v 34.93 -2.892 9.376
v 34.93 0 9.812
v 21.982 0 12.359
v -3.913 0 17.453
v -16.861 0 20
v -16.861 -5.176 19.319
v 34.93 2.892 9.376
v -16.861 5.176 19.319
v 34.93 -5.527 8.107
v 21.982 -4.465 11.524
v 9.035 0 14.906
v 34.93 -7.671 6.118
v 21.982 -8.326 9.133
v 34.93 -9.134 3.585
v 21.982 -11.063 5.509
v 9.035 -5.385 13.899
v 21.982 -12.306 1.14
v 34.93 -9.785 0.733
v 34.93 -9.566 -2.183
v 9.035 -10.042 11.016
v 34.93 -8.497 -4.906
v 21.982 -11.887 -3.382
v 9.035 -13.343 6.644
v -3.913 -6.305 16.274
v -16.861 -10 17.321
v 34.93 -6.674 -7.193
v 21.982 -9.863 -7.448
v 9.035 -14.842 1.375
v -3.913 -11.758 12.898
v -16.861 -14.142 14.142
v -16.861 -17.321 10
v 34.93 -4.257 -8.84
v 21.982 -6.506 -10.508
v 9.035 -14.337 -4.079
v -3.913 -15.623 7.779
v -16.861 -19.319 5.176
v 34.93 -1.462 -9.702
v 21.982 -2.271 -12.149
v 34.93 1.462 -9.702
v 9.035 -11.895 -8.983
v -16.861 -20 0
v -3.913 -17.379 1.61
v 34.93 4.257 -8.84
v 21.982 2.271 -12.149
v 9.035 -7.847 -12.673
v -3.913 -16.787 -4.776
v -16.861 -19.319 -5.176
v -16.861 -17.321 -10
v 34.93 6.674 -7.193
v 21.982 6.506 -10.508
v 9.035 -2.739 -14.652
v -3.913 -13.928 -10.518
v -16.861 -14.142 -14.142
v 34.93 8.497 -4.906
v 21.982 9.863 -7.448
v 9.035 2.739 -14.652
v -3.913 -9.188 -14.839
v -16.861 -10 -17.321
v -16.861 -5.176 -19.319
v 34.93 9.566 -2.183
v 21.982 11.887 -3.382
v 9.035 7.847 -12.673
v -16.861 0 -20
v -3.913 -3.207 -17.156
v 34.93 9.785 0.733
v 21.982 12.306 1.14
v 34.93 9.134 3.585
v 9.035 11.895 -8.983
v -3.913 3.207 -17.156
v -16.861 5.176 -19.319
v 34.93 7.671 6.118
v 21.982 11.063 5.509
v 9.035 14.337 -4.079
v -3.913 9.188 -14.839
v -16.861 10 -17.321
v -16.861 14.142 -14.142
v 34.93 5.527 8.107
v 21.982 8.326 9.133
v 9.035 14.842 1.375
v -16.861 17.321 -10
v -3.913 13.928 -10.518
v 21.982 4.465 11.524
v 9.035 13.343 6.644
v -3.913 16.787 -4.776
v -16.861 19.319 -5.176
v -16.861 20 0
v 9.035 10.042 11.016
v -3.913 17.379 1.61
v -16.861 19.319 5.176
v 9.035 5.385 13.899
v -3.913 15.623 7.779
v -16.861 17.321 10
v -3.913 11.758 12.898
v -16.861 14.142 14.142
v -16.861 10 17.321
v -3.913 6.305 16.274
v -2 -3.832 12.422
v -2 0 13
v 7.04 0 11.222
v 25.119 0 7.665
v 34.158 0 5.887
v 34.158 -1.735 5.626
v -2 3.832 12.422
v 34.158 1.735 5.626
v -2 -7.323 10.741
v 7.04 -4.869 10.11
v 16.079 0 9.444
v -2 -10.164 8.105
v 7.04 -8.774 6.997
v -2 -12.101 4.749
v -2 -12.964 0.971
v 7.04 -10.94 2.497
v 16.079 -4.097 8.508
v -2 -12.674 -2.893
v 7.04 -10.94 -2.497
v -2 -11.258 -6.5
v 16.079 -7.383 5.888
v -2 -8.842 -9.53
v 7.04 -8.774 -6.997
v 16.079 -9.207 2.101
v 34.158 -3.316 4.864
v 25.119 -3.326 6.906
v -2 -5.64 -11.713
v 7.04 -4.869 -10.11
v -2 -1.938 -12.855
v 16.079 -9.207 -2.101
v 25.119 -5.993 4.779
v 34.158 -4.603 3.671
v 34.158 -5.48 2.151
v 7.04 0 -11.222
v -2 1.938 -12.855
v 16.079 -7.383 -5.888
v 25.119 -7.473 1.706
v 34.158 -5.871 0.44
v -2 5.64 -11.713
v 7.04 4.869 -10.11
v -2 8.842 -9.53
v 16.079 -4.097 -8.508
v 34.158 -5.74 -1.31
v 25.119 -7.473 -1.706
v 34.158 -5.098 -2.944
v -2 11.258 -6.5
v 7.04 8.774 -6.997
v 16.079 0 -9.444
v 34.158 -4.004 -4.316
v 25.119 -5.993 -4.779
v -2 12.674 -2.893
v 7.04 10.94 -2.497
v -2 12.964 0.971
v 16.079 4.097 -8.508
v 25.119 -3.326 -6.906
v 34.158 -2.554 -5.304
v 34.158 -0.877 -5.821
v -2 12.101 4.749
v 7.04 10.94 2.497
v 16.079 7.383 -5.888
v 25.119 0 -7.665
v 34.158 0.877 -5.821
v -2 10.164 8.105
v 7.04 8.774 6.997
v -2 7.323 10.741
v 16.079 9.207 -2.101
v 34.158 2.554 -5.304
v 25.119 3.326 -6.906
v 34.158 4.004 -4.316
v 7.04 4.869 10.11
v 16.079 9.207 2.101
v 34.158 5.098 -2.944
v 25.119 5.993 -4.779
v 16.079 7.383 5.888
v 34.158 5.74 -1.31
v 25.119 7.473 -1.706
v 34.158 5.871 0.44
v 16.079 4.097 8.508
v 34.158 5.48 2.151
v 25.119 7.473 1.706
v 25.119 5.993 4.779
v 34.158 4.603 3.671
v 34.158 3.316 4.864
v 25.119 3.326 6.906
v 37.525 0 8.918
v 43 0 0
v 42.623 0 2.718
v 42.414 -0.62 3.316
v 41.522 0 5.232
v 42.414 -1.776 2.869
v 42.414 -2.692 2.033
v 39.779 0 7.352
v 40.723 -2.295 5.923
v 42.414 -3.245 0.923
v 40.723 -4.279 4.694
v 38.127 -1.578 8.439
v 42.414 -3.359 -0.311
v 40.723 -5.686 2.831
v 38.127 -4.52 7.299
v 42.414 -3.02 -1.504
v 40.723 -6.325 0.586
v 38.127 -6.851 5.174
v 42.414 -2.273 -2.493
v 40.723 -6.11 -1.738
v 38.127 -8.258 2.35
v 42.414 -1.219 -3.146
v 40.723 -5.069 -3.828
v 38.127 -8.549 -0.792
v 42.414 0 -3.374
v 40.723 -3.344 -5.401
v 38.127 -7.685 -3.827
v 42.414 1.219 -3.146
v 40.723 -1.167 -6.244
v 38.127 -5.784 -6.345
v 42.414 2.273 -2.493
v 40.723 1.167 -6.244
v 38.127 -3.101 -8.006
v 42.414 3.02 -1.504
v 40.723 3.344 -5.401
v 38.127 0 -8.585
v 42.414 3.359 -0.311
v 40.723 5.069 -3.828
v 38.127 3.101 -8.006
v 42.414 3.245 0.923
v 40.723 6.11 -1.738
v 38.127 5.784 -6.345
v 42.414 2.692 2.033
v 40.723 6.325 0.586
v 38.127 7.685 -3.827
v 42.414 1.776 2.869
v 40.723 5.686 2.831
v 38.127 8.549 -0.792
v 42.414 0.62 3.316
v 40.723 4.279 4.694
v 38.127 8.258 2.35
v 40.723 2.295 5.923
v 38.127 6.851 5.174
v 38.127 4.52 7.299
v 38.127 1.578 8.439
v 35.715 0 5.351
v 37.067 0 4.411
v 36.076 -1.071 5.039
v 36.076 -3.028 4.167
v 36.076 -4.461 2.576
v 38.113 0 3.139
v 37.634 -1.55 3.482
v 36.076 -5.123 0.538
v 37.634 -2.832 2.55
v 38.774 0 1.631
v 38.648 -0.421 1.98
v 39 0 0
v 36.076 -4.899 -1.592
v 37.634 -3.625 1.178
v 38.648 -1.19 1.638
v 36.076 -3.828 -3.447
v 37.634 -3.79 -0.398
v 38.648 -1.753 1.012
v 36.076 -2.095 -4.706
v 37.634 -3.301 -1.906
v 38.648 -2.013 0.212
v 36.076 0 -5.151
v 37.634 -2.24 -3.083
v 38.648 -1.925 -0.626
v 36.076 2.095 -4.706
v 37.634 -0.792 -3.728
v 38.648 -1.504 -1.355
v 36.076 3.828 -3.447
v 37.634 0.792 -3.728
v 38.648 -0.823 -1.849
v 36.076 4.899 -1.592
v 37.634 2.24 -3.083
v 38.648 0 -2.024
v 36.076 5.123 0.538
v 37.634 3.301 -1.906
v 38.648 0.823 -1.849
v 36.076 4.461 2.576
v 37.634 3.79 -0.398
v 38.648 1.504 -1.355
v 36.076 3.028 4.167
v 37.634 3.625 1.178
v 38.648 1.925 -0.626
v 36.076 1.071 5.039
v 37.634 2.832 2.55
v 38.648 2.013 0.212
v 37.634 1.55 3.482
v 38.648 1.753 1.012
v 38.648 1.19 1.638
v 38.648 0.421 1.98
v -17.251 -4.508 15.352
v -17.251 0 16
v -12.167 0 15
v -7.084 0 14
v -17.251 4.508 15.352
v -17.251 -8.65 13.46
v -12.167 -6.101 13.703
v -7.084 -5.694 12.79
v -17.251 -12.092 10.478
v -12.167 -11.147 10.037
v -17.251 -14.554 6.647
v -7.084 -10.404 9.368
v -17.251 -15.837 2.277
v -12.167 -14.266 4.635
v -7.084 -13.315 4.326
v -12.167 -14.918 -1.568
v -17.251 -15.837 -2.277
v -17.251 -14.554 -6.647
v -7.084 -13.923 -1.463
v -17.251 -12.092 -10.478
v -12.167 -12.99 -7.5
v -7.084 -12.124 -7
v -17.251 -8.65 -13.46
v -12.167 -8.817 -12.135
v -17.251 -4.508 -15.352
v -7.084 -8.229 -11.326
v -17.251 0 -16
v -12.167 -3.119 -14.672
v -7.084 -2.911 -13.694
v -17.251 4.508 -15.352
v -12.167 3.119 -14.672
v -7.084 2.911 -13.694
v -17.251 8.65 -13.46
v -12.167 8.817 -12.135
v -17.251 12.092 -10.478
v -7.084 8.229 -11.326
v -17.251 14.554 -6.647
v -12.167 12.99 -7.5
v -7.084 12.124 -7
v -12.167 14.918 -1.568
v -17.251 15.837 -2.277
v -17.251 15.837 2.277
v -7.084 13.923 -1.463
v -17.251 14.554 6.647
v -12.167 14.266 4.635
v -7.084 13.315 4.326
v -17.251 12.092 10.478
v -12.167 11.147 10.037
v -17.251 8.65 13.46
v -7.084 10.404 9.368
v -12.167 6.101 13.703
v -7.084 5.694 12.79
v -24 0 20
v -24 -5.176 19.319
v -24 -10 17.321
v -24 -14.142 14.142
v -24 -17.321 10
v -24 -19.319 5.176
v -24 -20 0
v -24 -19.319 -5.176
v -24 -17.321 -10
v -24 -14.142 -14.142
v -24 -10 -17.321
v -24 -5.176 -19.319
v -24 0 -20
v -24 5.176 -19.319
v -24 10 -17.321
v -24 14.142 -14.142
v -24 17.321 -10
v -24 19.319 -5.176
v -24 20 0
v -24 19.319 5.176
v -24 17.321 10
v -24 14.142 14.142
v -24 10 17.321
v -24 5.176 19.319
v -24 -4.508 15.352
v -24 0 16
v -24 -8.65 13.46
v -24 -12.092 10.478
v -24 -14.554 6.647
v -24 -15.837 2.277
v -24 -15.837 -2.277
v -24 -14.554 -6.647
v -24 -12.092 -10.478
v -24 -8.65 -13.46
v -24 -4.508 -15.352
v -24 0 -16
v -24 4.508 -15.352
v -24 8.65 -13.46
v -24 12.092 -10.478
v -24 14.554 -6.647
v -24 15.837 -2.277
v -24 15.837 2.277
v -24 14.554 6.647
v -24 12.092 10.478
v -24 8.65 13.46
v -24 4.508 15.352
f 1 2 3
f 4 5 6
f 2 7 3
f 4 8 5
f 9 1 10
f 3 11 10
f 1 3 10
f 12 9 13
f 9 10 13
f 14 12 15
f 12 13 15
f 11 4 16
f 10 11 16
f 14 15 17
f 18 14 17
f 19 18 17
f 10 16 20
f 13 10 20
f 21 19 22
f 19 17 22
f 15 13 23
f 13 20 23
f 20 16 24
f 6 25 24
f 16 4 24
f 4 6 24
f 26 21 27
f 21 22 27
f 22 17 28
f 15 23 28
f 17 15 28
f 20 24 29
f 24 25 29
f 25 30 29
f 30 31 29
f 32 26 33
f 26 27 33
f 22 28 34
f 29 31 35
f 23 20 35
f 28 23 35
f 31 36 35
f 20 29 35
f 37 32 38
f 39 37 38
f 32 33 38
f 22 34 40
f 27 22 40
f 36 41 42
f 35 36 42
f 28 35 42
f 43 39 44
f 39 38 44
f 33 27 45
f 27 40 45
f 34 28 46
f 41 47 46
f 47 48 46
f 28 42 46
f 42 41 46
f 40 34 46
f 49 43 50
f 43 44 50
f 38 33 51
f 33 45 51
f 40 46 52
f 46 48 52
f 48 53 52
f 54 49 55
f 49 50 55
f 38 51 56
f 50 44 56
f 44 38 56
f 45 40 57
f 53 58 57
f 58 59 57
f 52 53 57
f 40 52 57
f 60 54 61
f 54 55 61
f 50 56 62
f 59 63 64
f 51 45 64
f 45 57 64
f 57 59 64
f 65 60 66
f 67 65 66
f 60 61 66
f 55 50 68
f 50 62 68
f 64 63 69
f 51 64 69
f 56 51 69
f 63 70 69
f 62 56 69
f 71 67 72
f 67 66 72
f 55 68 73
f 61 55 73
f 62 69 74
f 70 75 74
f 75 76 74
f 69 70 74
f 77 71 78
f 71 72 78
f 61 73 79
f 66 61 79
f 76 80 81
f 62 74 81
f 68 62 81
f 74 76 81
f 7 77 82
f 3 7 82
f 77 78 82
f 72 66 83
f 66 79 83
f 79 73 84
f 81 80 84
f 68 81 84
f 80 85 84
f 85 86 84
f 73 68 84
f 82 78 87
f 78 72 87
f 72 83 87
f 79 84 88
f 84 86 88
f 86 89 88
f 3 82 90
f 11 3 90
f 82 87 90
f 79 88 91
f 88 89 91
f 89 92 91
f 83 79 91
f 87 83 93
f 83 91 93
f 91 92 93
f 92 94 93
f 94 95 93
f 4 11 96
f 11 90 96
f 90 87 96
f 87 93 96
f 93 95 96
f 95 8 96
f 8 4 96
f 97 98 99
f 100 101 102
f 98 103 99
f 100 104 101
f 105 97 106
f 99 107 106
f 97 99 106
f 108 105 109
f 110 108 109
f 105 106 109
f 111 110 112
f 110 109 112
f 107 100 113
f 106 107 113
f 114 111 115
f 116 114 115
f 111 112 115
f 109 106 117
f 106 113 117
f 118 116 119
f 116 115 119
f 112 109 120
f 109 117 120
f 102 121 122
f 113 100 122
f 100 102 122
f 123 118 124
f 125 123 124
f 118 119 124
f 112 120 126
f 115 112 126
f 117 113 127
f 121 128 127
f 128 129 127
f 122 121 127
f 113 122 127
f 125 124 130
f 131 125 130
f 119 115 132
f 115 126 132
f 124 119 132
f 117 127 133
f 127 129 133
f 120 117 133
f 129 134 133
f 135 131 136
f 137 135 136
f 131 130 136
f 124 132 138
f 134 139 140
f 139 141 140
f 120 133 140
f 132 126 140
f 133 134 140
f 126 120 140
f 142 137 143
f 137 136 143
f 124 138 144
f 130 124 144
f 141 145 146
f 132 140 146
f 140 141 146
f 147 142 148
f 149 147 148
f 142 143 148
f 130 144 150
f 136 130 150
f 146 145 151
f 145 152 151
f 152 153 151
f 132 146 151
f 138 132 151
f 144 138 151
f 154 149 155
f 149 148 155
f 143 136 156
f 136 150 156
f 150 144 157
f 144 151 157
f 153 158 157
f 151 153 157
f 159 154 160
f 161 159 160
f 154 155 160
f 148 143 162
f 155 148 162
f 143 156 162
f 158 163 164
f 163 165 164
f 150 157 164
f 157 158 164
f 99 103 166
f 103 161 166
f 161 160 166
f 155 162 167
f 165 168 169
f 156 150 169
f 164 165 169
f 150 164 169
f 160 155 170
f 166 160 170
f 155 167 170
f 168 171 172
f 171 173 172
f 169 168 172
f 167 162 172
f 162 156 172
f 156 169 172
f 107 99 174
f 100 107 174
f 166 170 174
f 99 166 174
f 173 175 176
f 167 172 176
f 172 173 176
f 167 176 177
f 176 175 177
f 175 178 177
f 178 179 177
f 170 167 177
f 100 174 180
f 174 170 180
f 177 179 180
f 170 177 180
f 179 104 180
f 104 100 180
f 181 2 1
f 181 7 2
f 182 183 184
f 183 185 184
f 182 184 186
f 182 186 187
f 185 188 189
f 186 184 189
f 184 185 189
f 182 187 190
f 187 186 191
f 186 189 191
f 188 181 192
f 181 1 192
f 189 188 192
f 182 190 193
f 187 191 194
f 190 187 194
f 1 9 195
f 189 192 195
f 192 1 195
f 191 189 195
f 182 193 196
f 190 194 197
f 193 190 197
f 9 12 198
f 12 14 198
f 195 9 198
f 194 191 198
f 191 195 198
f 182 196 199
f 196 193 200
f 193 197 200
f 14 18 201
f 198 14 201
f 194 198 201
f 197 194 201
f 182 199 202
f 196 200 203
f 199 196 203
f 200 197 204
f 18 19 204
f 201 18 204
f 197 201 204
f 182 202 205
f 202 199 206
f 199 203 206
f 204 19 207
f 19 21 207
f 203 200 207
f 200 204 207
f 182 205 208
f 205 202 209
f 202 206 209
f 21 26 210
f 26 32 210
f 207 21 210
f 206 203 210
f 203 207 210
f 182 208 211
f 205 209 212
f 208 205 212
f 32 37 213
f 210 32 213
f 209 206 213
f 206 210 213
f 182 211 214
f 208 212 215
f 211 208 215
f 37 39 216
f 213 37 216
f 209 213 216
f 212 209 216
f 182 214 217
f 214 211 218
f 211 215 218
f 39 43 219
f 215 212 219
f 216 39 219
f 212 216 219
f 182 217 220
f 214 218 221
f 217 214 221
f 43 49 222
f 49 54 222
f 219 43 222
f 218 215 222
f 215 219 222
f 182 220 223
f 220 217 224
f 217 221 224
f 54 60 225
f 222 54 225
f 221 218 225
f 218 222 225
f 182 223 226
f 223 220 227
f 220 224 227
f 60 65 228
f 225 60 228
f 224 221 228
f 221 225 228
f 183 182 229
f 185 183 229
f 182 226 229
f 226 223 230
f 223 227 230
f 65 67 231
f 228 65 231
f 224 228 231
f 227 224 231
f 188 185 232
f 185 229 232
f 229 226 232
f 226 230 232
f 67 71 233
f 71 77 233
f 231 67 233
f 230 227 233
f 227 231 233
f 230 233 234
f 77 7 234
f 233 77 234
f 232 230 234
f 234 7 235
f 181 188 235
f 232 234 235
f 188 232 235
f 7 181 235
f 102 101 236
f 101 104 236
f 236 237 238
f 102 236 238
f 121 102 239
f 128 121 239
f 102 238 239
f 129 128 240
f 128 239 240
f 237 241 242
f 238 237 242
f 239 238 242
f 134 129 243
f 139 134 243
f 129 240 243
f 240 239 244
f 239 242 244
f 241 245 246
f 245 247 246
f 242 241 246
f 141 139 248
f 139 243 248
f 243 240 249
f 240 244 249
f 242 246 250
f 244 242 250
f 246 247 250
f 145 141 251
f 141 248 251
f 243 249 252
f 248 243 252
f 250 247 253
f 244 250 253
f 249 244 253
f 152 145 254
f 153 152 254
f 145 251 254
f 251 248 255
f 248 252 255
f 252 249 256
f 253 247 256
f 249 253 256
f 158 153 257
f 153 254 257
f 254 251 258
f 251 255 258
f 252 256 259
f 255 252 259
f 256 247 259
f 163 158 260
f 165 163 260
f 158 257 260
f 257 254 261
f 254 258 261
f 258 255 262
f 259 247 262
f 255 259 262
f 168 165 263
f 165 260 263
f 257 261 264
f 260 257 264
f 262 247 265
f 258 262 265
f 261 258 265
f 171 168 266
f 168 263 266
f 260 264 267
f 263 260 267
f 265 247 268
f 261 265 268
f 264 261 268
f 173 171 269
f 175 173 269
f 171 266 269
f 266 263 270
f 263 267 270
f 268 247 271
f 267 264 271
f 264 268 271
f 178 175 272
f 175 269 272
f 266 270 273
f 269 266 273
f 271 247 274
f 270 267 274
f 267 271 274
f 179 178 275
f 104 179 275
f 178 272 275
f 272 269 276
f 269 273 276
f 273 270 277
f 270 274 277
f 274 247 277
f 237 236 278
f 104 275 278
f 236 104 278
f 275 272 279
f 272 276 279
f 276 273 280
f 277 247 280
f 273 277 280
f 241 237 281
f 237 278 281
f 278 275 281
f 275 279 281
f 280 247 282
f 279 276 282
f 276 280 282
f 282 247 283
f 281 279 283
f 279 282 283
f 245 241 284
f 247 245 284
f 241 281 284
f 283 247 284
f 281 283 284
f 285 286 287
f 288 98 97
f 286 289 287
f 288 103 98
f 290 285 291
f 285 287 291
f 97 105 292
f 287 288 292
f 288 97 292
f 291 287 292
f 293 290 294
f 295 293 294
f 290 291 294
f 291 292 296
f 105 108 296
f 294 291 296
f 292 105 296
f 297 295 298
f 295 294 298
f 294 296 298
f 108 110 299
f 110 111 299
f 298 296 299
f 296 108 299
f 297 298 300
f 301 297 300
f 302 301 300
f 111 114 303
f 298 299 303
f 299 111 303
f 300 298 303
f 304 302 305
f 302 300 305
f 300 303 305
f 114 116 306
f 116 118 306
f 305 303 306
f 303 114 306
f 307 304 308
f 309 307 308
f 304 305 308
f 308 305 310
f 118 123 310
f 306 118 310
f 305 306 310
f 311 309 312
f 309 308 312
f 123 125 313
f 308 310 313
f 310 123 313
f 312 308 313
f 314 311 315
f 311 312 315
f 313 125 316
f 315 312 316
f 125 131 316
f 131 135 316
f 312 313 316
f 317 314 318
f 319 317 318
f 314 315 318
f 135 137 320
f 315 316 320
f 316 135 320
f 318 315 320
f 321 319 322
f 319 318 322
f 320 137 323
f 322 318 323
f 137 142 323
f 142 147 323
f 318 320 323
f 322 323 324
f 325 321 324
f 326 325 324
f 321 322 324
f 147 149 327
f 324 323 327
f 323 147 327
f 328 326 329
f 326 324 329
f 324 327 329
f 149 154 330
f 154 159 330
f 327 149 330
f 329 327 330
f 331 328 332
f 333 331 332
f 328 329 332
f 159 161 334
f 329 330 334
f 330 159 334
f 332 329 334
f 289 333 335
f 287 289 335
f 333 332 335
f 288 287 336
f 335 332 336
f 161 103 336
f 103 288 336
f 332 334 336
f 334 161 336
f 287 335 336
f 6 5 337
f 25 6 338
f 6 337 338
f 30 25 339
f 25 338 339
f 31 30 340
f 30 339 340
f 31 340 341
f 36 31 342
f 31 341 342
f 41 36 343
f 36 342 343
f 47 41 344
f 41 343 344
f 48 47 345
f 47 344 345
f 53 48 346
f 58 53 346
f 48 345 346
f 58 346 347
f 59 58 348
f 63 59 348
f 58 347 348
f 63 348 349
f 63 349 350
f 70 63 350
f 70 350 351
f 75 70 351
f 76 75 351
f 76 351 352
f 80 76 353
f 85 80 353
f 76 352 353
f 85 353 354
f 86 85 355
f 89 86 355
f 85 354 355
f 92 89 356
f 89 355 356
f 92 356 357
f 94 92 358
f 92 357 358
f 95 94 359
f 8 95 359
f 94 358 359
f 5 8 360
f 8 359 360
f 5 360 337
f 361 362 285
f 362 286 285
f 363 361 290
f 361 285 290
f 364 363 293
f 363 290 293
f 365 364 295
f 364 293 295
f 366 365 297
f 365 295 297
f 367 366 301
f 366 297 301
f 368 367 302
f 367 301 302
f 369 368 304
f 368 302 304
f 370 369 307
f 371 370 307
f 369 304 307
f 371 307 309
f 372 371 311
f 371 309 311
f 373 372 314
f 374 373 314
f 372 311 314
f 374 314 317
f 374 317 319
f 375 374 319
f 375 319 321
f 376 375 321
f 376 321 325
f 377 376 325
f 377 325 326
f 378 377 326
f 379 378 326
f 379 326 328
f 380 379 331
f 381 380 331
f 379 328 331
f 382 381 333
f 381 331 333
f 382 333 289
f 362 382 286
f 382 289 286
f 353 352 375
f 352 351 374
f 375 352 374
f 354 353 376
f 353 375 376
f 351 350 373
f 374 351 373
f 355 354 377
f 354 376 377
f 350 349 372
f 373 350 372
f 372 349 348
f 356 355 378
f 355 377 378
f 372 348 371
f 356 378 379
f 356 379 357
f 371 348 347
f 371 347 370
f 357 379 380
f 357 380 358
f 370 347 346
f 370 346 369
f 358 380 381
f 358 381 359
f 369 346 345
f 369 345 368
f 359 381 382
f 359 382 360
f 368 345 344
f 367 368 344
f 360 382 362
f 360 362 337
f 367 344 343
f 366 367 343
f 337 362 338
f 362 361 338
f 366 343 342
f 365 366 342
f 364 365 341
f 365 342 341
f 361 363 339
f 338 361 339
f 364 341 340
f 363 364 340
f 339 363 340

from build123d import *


with BuildPart() as part:
    # Sketch1 → Revolve1 (revolve)
    with BuildSketch(Plane.XY, mode=Mode.PRIVATE) as revolve1_sk:
        with BuildLine():
            Line((-2, 13), (34.158093272, 5.887174193))
            ThreePointArc((34.158093272, 5.887174193), (37.634034939, 3.811262282), (39, 0))
            Line((39, 0), (43, 0))
            ThreePointArc((43, 0), (40.723391565, 6.352103804), (34.930155453, 9.811956988))
            Line((34.930155453, 9.811956988), (-16.860823192, 20))
            Line((-16.860823192, 20), (-24, 20))
            Line((-24, 20), (-24, 16))
            Line((-24, 16), (-17.250518254, 16))
            Line((-17.250518254, 16), (-2, 13))
        make_face()
    revolve(revolve1_sk.sketch.rotate(Axis((39, 0, 0), (1, 0, 0)), 90), axis=Axis((39, 0, 0), (1, 0, 0)))


solid = part.part
